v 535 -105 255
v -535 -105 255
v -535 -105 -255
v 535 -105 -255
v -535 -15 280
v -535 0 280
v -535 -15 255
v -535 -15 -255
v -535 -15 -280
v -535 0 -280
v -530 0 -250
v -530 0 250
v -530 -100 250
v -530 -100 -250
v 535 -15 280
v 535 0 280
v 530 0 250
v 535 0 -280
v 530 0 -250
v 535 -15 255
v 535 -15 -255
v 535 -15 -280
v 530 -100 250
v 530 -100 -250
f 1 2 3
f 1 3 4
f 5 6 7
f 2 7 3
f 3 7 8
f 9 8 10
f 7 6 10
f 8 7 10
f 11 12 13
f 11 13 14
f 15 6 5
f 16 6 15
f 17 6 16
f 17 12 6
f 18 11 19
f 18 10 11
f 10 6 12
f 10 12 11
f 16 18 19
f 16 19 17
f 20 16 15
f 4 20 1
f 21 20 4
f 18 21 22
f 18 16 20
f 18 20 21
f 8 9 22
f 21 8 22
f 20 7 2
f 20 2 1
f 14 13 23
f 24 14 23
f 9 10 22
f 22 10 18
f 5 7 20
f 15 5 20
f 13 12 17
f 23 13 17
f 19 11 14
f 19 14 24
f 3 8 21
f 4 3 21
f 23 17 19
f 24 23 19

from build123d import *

# Parameters (mm, degrees)
CROQUIS1_W            = 1070
CROQUIS1_H            = 510
CROQUIS1_W_2          = 1060
CROQUIS1_H_2          = 500
EXTRUIR_L_MINA1_DEPTH = 100
CROQUIS2_W            = 1070
CROQUIS2_H            = 510
EXTRUIR1_DEPTH        = 5
CROQUIS3_W            = 1070
CROQUIS3_H            = 25
EXTRUIR2_DEPTH        = 15


with BuildPart() as part:
    # Croquis1 → Extruir-Lámina1 (new body)
    with BuildSketch(Plane(origin=(0, 0, 0), x_dir=(1, 0, 0), z_dir=(0, 1, 0))):
        Rectangle(CROQUIS1_W, CROQUIS1_H)
        Rectangle(CROQUIS1_W_2, CROQUIS1_H_2, mode=Mode.SUBTRACT)
    extrude(amount=-EXTRUIR_L_MINA1_DEPTH)

    # Croquis2 → Extruir1 (add)
    with BuildSketch(Plane.XZ.offset(100)):
        Rectangle(CROQUIS2_W, CROQUIS2_H)
    extrude(amount=EXTRUIR1_DEPTH)

    # Croquis3 → Extruir2 (add)
    with BuildSketch(Plane(origin=(0, 0, 0), x_dir=(1, 0, 0), z_dir=(0, 1, 0))):
        with Locations((0, 267.5)):
            Rectangle(CROQUIS3_W, CROQUIS3_H)
        with Locations((0, -267.5)):
            Rectangle(CROQUIS3_W, CROQUIS3_H)
    extrude(amount=-EXTRUIR2_DEPTH)


solid = part.part
